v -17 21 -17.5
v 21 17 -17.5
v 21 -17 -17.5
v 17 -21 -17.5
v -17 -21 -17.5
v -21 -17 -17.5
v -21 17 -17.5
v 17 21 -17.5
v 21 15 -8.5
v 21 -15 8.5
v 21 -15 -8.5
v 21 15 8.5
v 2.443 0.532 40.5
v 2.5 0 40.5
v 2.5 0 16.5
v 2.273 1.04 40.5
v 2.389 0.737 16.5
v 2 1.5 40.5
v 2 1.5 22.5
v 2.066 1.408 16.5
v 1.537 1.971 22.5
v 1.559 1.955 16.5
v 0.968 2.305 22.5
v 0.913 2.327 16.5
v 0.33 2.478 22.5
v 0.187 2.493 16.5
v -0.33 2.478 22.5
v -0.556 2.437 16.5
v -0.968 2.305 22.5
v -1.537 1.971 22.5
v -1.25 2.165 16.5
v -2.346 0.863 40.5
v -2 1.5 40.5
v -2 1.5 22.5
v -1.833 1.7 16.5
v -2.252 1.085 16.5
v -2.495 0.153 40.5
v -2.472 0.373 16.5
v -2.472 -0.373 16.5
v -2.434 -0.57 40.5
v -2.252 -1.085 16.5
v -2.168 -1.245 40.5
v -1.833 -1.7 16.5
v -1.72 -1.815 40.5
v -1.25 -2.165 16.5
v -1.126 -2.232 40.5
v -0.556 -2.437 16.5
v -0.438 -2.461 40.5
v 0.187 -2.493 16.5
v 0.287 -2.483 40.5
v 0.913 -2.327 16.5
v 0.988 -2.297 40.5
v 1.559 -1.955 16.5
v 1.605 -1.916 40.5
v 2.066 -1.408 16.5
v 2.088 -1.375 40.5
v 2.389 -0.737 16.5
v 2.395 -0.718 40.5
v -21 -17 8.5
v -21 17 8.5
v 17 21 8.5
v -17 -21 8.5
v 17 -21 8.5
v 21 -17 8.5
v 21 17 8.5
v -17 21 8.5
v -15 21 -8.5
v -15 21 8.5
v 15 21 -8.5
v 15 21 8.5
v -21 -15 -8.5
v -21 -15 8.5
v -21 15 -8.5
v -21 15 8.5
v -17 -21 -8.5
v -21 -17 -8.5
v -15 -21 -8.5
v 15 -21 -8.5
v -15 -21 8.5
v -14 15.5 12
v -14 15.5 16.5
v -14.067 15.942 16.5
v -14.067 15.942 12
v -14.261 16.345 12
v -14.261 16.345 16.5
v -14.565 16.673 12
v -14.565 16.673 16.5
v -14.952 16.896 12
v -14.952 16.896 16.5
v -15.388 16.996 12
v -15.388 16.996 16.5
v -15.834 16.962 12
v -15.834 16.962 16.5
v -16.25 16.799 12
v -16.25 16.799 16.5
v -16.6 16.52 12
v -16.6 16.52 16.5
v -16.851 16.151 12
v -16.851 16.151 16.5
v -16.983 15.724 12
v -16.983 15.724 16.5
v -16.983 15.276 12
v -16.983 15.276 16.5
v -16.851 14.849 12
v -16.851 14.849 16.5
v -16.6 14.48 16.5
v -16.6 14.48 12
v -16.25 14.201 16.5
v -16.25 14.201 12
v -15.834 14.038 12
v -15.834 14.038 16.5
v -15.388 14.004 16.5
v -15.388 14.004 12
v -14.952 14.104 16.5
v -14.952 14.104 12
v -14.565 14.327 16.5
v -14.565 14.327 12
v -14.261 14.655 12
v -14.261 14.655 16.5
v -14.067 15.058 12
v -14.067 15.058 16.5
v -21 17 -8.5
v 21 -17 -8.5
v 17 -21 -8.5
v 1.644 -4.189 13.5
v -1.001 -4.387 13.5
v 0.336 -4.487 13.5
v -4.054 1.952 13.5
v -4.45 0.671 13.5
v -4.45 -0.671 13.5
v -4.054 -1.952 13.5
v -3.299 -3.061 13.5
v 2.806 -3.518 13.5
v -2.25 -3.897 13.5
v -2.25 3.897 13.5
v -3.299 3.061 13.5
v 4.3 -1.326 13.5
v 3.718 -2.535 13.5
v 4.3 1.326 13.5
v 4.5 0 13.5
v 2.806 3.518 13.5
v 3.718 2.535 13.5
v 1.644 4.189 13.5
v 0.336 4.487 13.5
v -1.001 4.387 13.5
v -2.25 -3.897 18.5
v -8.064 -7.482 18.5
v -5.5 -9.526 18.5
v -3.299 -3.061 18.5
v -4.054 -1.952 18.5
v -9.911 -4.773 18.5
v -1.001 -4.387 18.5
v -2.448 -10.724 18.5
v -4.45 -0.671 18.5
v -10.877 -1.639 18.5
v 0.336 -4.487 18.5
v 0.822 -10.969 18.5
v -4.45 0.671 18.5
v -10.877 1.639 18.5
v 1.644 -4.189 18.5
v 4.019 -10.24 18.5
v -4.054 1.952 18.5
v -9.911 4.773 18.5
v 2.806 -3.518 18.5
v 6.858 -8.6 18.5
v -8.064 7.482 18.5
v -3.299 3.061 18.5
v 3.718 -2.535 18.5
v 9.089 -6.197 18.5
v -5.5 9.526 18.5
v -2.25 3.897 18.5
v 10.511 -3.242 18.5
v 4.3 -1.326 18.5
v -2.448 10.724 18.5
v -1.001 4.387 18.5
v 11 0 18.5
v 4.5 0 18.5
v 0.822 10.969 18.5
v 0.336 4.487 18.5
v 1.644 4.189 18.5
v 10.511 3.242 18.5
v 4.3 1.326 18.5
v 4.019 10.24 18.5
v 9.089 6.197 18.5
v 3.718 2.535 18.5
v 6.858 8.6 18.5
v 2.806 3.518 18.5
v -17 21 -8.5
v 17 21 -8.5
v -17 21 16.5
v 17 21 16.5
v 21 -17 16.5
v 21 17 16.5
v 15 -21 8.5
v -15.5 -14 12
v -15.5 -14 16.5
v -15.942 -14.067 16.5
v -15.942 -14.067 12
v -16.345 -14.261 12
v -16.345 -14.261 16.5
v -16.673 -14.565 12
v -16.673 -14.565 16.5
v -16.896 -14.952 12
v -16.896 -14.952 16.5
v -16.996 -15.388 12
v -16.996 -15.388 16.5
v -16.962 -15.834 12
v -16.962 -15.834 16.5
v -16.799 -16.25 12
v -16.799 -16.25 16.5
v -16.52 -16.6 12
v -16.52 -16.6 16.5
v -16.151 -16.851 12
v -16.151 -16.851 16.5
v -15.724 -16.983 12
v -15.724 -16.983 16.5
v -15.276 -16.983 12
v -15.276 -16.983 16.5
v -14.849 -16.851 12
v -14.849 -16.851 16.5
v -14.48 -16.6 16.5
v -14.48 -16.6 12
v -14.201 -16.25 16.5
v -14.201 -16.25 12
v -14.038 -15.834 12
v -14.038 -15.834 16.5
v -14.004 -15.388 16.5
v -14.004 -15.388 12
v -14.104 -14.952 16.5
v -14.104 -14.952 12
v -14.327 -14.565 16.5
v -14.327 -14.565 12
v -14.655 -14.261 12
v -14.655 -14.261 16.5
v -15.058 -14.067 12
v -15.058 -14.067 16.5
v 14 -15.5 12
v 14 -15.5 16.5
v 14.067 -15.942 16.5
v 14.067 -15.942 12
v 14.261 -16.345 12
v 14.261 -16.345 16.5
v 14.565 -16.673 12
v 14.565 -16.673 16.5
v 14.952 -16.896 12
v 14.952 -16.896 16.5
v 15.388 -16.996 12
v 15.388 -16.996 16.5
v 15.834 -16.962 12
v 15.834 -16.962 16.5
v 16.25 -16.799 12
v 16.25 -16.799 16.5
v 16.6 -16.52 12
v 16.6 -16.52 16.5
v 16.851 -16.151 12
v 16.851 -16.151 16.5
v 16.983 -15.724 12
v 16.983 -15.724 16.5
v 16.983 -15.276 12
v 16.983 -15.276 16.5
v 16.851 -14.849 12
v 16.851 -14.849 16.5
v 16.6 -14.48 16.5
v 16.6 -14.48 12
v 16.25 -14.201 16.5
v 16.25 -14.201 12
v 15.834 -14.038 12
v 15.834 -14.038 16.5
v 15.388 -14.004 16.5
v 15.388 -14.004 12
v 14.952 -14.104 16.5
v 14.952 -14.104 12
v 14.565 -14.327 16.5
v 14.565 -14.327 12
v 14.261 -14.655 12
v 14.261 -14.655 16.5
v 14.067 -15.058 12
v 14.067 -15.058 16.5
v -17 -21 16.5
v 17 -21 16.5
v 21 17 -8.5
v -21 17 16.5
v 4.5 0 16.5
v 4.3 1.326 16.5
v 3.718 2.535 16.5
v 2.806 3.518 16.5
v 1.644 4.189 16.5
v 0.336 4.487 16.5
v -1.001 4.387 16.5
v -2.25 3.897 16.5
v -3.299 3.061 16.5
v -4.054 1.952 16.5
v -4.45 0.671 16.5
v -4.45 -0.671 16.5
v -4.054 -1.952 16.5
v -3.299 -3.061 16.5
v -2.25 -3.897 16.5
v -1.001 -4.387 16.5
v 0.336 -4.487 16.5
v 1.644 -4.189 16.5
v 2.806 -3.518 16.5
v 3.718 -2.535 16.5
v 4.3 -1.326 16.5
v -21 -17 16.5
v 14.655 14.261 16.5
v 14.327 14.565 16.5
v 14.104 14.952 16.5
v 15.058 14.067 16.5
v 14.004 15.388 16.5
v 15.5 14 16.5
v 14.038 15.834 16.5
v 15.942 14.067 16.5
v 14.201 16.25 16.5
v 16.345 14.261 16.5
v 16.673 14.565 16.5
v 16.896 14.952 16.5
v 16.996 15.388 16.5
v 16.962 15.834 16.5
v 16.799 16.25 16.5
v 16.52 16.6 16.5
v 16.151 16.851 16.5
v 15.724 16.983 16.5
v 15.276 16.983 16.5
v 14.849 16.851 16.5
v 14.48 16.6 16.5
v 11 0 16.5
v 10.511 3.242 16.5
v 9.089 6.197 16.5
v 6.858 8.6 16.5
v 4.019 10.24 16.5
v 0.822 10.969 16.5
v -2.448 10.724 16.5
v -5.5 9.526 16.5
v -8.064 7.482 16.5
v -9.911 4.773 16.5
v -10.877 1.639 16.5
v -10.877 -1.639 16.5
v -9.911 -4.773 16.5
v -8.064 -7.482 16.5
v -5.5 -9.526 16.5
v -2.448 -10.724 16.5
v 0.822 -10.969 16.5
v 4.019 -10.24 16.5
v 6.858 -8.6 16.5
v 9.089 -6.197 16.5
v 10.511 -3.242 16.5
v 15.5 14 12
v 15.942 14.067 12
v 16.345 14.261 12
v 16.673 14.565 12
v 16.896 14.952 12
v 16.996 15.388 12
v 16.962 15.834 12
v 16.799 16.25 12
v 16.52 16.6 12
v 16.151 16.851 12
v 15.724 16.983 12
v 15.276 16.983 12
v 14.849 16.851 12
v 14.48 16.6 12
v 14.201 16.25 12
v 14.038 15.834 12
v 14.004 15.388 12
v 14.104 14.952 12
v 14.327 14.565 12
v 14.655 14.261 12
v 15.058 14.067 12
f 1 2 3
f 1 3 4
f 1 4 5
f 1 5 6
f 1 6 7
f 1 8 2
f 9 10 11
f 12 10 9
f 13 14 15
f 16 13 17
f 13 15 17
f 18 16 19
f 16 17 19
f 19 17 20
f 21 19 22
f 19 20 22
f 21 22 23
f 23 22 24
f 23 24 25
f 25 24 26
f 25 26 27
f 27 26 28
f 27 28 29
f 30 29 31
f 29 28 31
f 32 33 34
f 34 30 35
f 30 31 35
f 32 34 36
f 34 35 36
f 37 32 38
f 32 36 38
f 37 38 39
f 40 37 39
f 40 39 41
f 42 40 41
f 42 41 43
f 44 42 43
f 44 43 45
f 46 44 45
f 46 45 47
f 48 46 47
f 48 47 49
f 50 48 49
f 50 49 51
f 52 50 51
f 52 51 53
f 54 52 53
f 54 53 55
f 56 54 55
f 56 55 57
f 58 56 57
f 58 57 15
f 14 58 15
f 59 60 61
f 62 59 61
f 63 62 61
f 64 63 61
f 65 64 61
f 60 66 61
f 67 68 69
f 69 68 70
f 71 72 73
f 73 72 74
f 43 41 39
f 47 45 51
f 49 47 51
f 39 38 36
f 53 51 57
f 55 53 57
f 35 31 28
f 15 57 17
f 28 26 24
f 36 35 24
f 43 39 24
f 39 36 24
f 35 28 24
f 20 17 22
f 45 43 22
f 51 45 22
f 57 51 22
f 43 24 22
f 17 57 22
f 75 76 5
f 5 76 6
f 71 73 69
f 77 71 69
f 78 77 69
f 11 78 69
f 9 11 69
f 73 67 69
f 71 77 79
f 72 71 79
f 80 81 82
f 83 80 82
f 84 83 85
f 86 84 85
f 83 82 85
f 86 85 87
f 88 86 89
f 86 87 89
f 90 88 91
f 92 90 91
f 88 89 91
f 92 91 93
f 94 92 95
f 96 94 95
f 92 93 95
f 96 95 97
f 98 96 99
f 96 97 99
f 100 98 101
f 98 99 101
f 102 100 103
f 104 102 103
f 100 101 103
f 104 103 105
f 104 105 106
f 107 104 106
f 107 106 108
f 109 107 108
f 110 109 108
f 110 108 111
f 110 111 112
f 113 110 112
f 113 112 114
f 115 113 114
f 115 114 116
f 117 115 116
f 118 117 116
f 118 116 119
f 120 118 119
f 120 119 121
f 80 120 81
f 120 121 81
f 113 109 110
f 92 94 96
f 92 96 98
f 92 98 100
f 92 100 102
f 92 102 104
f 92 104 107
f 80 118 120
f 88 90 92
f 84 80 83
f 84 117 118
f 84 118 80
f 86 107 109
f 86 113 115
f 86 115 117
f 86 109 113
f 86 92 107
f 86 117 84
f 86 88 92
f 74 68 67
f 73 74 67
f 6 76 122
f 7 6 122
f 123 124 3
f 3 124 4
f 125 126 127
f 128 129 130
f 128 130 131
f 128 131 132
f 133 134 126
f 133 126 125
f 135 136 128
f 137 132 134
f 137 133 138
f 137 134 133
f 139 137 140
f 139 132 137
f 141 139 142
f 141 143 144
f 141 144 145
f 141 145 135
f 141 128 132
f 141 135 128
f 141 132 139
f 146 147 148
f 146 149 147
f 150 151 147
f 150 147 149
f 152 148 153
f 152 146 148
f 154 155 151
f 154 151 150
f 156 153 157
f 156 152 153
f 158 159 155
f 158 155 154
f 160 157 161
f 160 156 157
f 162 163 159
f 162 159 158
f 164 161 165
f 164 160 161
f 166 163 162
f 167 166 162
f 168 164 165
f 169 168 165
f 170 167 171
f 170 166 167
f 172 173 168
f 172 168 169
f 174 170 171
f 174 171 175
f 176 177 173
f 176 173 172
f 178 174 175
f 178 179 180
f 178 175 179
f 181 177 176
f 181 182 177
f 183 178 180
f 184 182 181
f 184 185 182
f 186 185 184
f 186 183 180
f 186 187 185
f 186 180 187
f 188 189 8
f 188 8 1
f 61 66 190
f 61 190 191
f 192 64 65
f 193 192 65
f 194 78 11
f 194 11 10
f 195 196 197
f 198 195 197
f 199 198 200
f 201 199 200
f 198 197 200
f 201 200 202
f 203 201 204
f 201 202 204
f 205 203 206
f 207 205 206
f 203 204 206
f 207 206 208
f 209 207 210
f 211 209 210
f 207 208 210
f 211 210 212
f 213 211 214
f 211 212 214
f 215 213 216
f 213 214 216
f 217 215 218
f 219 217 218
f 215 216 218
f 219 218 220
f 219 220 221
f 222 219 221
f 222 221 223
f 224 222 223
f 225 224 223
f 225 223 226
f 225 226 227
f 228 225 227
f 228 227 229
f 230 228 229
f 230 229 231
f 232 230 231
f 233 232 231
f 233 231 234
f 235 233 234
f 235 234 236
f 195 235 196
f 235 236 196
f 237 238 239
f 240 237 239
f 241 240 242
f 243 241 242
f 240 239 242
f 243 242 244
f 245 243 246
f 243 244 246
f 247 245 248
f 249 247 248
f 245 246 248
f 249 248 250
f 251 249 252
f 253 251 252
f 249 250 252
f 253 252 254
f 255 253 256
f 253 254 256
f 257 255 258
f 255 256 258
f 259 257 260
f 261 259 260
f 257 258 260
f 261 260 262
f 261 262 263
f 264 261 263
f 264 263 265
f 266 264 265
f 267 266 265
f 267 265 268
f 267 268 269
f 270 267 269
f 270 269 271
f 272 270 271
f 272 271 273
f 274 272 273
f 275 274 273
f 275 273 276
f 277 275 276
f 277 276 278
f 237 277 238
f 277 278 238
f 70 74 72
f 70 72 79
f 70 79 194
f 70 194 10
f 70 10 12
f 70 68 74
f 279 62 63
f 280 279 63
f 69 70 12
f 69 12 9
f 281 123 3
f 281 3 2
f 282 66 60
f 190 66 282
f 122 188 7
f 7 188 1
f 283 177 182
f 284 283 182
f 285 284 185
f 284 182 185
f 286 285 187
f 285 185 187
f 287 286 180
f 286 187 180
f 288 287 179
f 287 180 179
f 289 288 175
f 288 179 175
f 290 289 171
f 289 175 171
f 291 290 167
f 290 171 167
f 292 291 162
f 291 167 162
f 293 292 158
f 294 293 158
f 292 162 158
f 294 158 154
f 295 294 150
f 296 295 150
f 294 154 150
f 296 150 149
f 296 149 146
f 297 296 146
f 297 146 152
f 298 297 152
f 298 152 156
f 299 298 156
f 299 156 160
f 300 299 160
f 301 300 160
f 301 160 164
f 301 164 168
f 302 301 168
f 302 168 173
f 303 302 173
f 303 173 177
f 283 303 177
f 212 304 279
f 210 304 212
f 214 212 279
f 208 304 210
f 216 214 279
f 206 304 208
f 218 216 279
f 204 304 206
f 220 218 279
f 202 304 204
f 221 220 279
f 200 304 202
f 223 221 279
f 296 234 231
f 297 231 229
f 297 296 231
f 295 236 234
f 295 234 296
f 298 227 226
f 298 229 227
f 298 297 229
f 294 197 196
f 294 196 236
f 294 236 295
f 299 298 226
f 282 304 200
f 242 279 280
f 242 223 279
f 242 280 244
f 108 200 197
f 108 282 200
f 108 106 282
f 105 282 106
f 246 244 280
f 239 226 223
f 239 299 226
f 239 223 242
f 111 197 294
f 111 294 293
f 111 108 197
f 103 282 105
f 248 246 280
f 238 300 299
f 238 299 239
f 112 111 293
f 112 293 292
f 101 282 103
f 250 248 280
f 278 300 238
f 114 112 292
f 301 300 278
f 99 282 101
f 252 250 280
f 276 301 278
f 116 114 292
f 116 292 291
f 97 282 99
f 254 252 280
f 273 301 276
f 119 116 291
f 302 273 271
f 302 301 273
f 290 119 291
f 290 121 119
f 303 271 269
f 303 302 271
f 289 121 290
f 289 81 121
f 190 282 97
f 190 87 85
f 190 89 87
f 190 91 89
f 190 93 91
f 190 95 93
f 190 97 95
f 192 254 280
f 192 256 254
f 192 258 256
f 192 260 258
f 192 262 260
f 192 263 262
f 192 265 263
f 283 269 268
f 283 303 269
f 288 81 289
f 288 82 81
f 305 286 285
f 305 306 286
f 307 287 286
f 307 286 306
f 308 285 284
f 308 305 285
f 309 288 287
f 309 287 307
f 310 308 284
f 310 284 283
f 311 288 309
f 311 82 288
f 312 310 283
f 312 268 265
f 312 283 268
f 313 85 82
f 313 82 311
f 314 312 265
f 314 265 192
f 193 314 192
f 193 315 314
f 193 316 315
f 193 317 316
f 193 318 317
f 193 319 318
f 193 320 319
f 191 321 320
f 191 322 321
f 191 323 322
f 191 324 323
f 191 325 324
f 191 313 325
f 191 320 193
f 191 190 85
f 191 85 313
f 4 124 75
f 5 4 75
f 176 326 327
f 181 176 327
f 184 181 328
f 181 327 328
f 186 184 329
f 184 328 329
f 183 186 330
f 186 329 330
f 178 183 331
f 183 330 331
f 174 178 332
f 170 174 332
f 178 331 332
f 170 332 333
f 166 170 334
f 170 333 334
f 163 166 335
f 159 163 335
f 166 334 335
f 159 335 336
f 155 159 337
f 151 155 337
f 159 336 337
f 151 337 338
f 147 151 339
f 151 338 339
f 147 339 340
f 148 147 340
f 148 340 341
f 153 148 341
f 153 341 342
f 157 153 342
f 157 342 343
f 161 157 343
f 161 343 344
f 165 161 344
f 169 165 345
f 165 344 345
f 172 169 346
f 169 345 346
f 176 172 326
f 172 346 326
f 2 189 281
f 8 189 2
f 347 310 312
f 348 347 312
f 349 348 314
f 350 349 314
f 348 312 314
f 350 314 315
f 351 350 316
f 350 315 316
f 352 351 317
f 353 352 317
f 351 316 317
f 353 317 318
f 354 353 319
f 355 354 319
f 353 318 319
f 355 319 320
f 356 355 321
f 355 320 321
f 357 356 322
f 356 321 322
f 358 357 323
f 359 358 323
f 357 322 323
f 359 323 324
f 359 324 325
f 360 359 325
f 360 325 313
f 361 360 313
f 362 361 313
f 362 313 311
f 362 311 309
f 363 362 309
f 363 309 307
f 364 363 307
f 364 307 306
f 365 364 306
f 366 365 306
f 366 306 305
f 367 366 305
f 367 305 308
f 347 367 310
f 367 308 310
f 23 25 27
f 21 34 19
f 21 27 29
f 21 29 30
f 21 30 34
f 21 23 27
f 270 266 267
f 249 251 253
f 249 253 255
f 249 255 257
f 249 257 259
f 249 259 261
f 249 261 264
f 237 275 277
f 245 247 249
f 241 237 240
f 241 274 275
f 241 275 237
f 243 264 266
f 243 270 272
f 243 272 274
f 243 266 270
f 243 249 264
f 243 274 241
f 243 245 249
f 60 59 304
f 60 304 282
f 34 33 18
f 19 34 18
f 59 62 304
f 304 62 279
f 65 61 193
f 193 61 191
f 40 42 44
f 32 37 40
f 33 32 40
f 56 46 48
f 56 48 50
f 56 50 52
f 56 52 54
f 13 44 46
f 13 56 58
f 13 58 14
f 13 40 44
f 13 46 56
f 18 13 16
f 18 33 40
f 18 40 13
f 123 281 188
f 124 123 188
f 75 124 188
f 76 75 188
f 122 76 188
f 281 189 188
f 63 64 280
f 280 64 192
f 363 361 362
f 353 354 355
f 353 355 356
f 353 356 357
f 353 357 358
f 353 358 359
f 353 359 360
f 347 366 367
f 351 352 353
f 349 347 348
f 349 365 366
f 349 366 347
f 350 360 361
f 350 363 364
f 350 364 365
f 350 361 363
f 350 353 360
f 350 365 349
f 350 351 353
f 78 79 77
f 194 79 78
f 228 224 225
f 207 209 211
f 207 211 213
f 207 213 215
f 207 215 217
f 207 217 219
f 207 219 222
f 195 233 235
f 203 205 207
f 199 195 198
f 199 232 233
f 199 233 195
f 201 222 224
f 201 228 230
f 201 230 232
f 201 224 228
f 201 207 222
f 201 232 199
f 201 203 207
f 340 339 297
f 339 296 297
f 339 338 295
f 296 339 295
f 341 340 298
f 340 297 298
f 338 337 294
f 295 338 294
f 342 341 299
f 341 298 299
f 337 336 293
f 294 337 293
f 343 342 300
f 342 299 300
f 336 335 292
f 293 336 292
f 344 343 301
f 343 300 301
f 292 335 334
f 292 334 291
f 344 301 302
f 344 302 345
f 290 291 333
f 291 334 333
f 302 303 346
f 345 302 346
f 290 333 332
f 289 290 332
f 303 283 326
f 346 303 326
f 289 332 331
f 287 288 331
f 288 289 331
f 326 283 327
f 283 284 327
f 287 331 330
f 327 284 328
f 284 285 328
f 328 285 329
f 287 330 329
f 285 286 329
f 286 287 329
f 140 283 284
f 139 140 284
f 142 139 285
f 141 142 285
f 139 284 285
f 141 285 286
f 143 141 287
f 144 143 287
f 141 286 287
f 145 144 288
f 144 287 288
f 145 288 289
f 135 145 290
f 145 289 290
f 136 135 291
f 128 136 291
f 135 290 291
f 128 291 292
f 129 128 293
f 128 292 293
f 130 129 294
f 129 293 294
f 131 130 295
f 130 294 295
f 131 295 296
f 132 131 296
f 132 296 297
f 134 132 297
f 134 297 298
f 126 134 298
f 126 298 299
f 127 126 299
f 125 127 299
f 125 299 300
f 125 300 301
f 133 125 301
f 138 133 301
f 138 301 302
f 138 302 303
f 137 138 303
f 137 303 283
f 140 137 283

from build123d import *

# Parameters (mm, degrees)
SKETCH_1_W               = 42
SKETCH_1_H               = 42
EXTRUDE_1_DEPTH          = 8.5
CHAMFER_1_SIZE           = 6
SKETCH_15_W              = 42
SKETCH_15_H              = 42
EXTRUDE_11_DEPTH         = 8
SKETCH_16_W              = 42
SKETCH_16_H              = 42
EXTRUDE_12_DEPTH         = 9
CHAMFER_2_SIZE           = 4
CHAMFER_3_SIZE           = 4
SKETCH_2_R               = 11
EXTRUDE_2_DEPTH          = 2
SKETCH_3_R               = 4.5
CUT_EXTRUDE_1_DEPTH      = 5
SKETCH_6_R               = 2.5
EXTRUDE_9_DEPTH          = 24
SKETCH_8_R               = 1.5
CUT_EXTRUDE_3_DEPTH      = 4.5
CUT_EXTRUDE_4_DEPTH      = 18
PATTERN_CIRCULAR_1_COUNT = 4


with BuildPart() as part:
    # 草圖1 → 填料-伸長1 (new body, symmetric)
    with BuildSketch(Plane.XY):
        Rectangle(SKETCH_1_W, SKETCH_1_H)
    extrude(amount=EXTRUDE_1_DEPTH, both=True)

    # 導角1
    chamfer_1_edges = [part.edges().sort_by_distance(p)[0] for p in [
        (21, -21, 0),
        (-21, -21, 0),
        (-21, 21, 0),
        (21, 21, 0),
    ]]
    chamfer(chamfer_1_edges, length=CHAMFER_1_SIZE)


with BuildPart() as body_2:
    # 草圖15 → 填料-伸長11 (new body)
    with BuildSketch(Plane.XY.offset(8.5)):
        Rectangle(SKETCH_15_W, SKETCH_15_H)
    extrude(amount=EXTRUDE_11_DEPTH)

    # 導角2
    chamfer_2_edges = [body_2.edges().sort_by_distance(p)[0] for p in [
        (21, -21, 12.5),
        (-21, -21, 12.5),
        (-21, 21, 12.5),
        (21, 21, 12.5),
    ]]
    chamfer(chamfer_2_edges, length=CHAMFER_2_SIZE)


with BuildPart() as body_3:
    # 草圖16 → 填料-伸長12 (new body)
    with BuildSketch(Plane(origin=(0, 0, -8.5), x_dir=(-1, 0, 0), z_dir=(0, 0, -1))):
        Rectangle(SKETCH_16_W, SKETCH_16_H)
    extrude(amount=EXTRUDE_12_DEPTH)

    # 導角3
    chamfer_3_edges = [body_3.edges().sort_by_distance(p)[0] for p in [
        (-21, -21, -13),
        (21, -21, -13),
        (21, 21, -13),
        (-21, 21, -13),
    ]]
    chamfer(chamfer_3_edges, length=CHAMFER_3_SIZE)


with BuildPart() as body_4:
    # 草圖2 → 填料-伸長2 (new body)
    with BuildSketch(Plane.XY.offset(16.5)):
        Circle(SKETCH_2_R)
    extrude(amount=EXTRUDE_2_DEPTH)


with BuildPart() as cut_extrude_1_tool:
    # 草圖3 → 除料-伸長1 (new body)
    with BuildSketch(Plane.XY.offset(18.5)):
        Circle(SKETCH_3_R)
    extrude(amount=-CUT_EXTRUDE_1_DEPTH)


with BuildPart() as body_2_1:
    add(body_2.part)

    # 除料-伸長1: cut by cut_extrude_1_tool
    add(cut_extrude_1_tool.part, mode=Mode.SUBTRACT)

    # 草圖8 → 除料-伸長3 (cut)
    with BuildSketch(Plane.XY.offset(16.5)):
        with Locations((-15.5, 15.5)):
            Circle(SKETCH_8_R)
    cut_extrude_3 = extrude(amount=-CUT_EXTRUDE_3_DEPTH, mode=Mode.SUBTRACT)

    # 環狀複製排列1: 除料-伸長3 ×4 about axis
    pattern_circular_1_axis = Axis((0, 0, 0), (0, 0, 1))
    for i in range(1, PATTERN_CIRCULAR_1_COUNT):
        add(cut_extrude_3.rotate(pattern_circular_1_axis, i * 360 / PATTERN_CIRCULAR_1_COUNT), mode=Mode.SUBTRACT)


with BuildPart() as body_4_1:
    add(body_4.part)

    # 除料-伸長1: cut by cut_extrude_1_tool
    add(cut_extrude_1_tool.part, mode=Mode.SUBTRACT)


with BuildPart() as body_5:
    # 草圖6 → 填料-伸長9 (new body)
    with BuildSketch(Plane.XY.offset(16.5)):
        Circle(SKETCH_6_R)
    extrude(amount=EXTRUDE_9_DEPTH)

    # 草圖11 → 除料-伸長4 (cut)
    with BuildSketch(Plane.XY.offset(40.5)):
        with BuildLine():
            Line((-2, 1.5), (2, 1.5))
            ThreePointArc((2, 1.5), (0, 2.5), (-2, 1.5))
        make_face()
    extrude(amount=-CUT_EXTRUDE_4_DEPTH, mode=Mode.SUBTRACT)


solid = Compound([part.part, body_3.part, body_2_1.part, body_4_1.part, body_5.part])
